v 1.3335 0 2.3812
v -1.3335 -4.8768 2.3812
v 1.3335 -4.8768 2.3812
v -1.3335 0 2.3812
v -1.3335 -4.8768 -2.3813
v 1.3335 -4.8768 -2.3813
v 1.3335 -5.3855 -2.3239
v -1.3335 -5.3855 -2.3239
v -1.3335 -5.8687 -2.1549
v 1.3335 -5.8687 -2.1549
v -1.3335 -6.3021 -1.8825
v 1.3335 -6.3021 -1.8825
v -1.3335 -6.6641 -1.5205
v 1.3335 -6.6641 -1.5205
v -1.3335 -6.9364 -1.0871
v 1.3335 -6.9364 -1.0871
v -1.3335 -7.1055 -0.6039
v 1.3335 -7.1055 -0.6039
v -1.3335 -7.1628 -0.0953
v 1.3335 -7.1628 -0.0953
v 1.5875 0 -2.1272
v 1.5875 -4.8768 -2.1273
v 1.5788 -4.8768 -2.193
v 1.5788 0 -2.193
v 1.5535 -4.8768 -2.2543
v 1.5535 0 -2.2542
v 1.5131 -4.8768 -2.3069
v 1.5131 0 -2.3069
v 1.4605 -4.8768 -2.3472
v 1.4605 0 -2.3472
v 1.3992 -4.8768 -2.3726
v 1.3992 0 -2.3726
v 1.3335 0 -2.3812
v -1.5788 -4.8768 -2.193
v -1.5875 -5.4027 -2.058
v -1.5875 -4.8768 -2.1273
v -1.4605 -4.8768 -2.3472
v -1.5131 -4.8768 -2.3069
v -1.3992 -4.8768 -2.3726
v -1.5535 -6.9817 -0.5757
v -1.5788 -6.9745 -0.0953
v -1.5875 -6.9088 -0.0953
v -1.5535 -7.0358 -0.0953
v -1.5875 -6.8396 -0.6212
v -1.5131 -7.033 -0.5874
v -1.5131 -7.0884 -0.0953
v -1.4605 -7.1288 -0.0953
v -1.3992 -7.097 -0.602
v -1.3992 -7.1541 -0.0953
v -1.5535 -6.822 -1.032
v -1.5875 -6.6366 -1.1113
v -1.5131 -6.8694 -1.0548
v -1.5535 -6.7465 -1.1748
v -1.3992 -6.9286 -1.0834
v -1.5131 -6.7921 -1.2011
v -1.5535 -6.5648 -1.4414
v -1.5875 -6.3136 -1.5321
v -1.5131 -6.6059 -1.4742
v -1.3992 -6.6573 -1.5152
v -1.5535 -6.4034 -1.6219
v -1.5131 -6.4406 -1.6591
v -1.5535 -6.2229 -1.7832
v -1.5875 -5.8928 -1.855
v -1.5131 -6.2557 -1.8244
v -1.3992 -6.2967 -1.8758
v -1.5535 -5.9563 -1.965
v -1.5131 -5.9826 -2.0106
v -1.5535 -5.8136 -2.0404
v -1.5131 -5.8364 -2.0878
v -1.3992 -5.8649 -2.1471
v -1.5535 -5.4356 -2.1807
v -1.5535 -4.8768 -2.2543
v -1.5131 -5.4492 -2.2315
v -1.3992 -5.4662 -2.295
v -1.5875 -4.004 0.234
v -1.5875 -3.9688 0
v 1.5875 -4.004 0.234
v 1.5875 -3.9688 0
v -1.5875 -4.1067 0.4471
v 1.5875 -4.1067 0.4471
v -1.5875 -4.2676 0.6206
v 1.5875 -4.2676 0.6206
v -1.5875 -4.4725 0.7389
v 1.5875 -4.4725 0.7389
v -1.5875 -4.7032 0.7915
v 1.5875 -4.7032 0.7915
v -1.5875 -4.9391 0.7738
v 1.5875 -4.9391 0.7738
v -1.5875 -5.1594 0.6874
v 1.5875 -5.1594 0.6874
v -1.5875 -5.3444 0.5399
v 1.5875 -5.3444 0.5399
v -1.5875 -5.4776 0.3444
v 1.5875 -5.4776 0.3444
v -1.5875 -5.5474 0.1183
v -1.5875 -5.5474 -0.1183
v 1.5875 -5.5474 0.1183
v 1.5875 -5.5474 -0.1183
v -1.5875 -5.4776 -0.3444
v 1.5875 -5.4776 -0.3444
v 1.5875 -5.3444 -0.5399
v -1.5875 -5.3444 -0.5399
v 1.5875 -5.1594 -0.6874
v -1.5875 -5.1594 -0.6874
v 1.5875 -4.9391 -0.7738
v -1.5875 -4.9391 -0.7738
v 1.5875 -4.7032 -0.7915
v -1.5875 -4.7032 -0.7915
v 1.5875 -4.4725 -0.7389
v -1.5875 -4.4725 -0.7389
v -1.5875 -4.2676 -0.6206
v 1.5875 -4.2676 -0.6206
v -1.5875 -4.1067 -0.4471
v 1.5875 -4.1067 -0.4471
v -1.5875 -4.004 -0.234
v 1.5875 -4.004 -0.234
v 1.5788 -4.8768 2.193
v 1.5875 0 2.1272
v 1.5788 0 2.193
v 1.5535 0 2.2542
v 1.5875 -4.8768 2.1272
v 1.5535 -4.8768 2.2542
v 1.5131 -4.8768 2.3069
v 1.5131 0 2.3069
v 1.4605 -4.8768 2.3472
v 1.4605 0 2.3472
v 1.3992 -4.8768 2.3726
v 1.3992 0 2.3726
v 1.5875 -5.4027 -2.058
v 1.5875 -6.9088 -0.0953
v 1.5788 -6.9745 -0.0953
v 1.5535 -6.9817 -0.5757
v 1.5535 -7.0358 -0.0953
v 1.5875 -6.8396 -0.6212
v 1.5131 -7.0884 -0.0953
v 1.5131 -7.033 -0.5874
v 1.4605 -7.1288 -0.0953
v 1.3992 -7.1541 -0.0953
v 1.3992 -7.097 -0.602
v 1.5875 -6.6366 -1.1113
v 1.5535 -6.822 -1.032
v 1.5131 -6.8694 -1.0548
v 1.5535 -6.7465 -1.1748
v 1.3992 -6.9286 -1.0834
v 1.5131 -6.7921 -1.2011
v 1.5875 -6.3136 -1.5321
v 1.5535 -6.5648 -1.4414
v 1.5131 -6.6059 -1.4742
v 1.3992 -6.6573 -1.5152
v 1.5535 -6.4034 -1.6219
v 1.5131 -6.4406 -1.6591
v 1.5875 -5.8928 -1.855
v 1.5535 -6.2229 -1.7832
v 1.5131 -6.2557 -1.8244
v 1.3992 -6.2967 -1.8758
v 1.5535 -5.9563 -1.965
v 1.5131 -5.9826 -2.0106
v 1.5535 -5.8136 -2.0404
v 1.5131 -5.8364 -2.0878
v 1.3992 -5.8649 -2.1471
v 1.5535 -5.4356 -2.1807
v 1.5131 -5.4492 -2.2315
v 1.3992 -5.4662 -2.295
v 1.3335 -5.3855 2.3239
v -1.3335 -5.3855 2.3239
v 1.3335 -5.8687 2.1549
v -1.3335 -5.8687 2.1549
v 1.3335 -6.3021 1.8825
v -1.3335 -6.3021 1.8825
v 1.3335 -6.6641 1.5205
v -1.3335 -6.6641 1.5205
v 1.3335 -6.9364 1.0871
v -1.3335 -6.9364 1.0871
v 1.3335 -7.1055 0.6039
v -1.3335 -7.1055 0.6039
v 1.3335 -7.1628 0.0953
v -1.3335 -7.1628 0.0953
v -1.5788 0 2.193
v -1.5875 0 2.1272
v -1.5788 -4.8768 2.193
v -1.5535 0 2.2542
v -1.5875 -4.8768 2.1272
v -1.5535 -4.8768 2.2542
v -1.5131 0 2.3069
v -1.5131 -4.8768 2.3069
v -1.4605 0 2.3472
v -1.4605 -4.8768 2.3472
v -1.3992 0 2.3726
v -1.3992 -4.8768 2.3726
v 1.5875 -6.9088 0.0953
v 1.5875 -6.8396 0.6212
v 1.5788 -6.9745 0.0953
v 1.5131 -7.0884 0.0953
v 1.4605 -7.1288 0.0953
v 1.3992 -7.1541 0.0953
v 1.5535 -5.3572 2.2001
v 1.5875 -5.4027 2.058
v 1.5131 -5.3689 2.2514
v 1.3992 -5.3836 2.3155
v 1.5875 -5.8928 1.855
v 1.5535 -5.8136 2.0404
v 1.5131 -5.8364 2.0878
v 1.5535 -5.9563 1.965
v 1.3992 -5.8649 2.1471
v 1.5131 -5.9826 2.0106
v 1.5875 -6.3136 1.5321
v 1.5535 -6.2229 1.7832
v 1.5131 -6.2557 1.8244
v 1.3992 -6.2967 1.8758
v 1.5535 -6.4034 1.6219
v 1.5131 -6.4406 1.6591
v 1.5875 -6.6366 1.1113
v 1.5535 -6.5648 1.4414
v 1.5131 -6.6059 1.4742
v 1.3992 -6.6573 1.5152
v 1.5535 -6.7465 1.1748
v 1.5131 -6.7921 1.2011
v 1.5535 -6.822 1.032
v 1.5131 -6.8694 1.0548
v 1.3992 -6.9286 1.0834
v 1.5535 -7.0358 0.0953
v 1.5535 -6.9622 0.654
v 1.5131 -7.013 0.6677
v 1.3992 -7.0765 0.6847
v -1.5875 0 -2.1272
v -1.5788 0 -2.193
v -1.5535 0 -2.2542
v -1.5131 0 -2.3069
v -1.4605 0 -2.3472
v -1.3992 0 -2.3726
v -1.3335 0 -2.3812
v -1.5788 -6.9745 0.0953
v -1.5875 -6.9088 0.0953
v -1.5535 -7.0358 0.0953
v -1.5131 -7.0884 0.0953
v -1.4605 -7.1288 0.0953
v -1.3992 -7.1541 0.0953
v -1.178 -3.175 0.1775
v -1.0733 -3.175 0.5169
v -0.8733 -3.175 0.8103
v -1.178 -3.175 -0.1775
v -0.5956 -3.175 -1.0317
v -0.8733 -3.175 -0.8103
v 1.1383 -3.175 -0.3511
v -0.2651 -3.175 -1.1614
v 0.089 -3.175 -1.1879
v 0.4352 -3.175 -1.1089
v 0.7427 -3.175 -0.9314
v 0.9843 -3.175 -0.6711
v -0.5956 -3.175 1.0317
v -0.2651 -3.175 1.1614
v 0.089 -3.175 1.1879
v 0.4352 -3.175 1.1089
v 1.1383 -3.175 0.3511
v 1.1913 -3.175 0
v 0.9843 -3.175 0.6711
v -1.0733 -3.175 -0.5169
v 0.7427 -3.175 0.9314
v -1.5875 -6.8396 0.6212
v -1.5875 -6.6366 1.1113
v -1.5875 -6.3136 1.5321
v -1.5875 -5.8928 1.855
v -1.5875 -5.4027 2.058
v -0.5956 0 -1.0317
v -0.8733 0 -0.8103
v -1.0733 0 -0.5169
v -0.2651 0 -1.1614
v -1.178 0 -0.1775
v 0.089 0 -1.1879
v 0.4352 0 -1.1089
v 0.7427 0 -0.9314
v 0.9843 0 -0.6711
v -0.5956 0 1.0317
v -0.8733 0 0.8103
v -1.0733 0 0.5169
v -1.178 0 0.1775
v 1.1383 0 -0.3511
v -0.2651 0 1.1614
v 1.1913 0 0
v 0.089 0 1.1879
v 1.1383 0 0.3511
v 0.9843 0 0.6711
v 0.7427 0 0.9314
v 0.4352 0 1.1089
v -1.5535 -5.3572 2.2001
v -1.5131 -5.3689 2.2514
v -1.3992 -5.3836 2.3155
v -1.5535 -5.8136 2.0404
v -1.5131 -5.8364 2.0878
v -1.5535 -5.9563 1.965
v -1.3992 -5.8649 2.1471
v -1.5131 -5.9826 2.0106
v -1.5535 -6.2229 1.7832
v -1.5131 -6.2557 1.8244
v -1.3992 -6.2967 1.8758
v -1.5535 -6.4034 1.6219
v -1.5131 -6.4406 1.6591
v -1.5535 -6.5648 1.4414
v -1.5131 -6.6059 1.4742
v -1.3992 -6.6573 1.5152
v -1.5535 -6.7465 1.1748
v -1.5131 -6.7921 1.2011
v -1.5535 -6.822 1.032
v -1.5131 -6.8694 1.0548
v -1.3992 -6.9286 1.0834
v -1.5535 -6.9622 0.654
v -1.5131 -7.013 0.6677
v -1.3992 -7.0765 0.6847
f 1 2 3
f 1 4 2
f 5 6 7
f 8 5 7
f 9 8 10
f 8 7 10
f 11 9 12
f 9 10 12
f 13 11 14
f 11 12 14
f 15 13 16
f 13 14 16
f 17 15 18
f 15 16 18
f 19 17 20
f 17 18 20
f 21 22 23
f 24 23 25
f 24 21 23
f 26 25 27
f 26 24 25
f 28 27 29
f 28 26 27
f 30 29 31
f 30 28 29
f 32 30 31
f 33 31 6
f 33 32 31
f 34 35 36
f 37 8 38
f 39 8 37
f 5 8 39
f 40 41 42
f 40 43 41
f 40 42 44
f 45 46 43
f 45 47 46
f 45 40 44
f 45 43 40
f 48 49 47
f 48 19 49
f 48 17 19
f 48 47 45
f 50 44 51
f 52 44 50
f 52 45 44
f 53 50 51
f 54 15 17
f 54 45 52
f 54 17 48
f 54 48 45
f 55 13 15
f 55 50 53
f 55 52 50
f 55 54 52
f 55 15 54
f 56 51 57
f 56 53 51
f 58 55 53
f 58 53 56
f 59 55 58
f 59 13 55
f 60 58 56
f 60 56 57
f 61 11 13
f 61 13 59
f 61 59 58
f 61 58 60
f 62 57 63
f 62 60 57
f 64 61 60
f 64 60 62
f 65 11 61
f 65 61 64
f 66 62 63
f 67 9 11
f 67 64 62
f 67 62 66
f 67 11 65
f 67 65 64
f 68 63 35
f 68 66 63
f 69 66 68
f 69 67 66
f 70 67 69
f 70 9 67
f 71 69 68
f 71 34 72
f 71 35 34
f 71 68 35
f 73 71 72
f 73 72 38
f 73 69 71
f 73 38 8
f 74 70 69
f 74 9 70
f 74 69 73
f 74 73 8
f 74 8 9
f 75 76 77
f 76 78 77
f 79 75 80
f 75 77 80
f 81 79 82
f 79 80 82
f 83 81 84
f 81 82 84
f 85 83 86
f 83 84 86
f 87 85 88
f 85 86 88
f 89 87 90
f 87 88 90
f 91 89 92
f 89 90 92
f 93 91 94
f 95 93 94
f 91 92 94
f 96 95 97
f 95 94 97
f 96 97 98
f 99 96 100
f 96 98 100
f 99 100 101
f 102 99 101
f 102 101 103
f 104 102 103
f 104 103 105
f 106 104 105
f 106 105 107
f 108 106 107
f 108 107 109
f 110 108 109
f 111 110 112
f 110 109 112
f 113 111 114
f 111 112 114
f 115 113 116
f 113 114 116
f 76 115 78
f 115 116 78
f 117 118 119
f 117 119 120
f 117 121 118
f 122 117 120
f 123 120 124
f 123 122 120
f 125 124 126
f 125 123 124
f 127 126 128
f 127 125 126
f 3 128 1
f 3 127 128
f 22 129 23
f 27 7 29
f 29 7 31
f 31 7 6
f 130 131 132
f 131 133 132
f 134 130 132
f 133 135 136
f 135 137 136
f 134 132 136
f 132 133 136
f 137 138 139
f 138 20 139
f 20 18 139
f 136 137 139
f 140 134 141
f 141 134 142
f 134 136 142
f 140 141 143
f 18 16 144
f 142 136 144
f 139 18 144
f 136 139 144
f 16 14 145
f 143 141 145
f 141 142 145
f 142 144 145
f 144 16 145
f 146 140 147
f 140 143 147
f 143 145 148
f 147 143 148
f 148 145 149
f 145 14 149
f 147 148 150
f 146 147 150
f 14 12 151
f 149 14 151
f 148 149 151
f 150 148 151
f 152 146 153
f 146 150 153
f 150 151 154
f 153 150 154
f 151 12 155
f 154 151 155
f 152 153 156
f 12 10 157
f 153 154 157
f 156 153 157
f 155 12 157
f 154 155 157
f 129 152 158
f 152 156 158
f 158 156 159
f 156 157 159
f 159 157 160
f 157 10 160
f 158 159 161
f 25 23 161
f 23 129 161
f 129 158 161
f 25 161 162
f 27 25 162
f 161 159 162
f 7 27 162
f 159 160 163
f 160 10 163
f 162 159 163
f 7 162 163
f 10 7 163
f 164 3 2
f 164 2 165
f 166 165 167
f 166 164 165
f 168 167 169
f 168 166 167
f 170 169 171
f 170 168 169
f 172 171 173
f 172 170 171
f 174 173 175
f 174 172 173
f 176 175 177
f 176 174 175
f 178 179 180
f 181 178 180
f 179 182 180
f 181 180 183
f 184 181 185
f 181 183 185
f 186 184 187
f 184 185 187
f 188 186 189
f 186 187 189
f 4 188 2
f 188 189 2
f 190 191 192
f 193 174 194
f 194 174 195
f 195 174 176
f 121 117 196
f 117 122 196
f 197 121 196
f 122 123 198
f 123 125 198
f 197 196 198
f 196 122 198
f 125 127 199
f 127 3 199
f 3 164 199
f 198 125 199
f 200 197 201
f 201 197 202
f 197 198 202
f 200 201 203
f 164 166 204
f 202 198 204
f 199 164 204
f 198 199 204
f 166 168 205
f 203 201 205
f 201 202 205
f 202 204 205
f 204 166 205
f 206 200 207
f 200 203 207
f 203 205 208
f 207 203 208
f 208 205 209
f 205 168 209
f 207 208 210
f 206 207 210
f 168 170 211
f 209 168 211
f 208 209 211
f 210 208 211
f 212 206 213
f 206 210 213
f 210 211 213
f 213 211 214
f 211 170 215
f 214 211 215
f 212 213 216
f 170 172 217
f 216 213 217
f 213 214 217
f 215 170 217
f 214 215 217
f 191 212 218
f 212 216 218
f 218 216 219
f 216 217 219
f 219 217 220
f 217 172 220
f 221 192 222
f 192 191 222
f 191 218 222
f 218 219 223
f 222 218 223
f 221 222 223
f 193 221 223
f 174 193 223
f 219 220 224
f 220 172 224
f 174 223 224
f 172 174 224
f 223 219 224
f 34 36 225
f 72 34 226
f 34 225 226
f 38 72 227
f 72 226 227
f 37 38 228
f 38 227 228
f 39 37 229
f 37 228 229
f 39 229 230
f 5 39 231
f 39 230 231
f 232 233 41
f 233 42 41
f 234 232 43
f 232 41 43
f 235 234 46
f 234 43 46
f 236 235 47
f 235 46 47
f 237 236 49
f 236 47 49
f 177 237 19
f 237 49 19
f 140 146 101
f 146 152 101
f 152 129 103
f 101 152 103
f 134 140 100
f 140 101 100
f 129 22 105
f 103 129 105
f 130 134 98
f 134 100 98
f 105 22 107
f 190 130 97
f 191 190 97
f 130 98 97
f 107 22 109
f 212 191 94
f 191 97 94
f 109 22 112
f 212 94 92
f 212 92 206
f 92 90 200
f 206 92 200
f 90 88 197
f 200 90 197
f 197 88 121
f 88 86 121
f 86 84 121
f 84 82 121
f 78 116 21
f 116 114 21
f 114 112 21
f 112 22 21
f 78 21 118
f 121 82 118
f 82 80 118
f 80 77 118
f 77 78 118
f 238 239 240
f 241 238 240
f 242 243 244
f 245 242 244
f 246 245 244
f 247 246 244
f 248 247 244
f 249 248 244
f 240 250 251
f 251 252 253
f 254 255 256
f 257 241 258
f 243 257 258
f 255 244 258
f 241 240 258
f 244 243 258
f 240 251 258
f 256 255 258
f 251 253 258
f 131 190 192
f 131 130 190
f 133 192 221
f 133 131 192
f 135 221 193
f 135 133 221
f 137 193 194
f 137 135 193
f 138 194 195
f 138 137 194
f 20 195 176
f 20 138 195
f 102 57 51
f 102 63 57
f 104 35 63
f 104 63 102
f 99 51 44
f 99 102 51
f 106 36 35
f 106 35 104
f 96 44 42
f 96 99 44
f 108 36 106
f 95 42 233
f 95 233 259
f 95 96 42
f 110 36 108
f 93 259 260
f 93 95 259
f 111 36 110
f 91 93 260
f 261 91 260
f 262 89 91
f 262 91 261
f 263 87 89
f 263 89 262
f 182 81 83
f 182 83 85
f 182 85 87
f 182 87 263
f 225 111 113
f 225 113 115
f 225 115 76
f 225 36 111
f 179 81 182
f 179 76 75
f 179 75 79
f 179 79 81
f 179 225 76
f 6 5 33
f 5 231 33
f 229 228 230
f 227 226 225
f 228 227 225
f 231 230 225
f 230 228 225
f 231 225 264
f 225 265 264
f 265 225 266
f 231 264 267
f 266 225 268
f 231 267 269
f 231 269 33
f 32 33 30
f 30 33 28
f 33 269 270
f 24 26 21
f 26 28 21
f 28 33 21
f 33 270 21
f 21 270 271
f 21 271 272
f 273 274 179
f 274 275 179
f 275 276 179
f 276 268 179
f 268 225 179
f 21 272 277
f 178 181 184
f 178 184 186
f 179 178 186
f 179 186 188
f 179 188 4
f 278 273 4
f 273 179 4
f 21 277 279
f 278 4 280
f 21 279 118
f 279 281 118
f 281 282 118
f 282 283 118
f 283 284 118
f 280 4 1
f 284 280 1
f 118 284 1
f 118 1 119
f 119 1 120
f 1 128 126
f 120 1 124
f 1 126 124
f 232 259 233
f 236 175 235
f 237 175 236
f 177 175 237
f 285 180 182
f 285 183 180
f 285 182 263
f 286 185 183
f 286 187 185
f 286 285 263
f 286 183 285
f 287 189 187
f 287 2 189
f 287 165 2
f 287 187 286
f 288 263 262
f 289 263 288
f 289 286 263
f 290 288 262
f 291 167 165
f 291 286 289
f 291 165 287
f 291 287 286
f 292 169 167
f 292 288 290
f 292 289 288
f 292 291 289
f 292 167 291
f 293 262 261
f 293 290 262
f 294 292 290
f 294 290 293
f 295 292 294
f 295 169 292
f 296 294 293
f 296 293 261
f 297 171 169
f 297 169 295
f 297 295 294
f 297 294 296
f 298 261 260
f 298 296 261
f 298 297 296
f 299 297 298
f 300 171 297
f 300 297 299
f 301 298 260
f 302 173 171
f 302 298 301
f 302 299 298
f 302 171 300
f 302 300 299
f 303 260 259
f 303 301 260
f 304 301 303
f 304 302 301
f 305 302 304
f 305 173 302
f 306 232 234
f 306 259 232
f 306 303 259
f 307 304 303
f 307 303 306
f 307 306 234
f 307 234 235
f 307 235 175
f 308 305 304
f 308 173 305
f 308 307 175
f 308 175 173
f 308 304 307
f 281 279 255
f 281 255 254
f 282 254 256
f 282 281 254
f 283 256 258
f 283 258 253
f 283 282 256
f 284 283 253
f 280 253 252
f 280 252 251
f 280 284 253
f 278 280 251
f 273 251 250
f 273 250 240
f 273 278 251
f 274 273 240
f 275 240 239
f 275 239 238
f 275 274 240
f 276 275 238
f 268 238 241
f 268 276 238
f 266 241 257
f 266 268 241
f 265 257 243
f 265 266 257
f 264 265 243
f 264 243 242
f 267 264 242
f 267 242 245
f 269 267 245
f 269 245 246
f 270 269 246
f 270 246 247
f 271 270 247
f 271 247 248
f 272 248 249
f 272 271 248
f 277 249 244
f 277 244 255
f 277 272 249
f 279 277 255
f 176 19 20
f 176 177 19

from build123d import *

# Parameters (mm, degrees)
F0_W          = 3.175
F0_H          = 4.7625
F1_DEPTH      = 7.1628
F2_R          = 2.286
F3_R          = 1.19126
F4_DEPTH      = 3.175
F5_R          = 0.79375
F6_DEPTH      = 25.4
F6_DEPTH_BACK = 25.4
F7_R          = 0.254


with BuildPart() as f1:
    # F0 (on Front) → F1 (new body)
    with BuildSketch(Plane.XZ):
        Rectangle(F0_W, F0_H)
    extrude(amount=F1_DEPTH)

    # F2
    f2_edges = [f1.edges().sort_by_distance(p)[0] for p in [
        (0, -7.1628, 2.38125),
        (0, -7.1628, -2.38125),
    ]]
    fillet(f2_edges, radius=F2_R)

    # F3 (on Front) → F4 (cut)
    with BuildSketch(Plane.XZ):
        Circle(F3_R)
    extrude(amount=F4_DEPTH, mode=Mode.SUBTRACT)

    # F5 (on Right) → F6 (cut, two sides)
    with BuildSketch(Plane.YZ) as f6_sk:
        with Locations((-4.7625, 0)):
            Circle(F5_R)
    extrude(amount=-F6_DEPTH, mode=Mode.SUBTRACT)
    extrude(f6_sk.sketch, amount=F6_DEPTH_BACK, mode=Mode.SUBTRACT)

    # F7
    f7_edges = [f1.edges().sort_by_distance(p)[0] for p in [
        (1.5875, -2.4384, 2.38125),
        (1.5875, -6.493246, 1.711696),
        (-1.5875, -6.493246, 1.711696),
        (-1.5875, -6.493246, -1.711696),
    ]]
    fillet(f7_edges, radius=F7_R)


solid = f1.part
